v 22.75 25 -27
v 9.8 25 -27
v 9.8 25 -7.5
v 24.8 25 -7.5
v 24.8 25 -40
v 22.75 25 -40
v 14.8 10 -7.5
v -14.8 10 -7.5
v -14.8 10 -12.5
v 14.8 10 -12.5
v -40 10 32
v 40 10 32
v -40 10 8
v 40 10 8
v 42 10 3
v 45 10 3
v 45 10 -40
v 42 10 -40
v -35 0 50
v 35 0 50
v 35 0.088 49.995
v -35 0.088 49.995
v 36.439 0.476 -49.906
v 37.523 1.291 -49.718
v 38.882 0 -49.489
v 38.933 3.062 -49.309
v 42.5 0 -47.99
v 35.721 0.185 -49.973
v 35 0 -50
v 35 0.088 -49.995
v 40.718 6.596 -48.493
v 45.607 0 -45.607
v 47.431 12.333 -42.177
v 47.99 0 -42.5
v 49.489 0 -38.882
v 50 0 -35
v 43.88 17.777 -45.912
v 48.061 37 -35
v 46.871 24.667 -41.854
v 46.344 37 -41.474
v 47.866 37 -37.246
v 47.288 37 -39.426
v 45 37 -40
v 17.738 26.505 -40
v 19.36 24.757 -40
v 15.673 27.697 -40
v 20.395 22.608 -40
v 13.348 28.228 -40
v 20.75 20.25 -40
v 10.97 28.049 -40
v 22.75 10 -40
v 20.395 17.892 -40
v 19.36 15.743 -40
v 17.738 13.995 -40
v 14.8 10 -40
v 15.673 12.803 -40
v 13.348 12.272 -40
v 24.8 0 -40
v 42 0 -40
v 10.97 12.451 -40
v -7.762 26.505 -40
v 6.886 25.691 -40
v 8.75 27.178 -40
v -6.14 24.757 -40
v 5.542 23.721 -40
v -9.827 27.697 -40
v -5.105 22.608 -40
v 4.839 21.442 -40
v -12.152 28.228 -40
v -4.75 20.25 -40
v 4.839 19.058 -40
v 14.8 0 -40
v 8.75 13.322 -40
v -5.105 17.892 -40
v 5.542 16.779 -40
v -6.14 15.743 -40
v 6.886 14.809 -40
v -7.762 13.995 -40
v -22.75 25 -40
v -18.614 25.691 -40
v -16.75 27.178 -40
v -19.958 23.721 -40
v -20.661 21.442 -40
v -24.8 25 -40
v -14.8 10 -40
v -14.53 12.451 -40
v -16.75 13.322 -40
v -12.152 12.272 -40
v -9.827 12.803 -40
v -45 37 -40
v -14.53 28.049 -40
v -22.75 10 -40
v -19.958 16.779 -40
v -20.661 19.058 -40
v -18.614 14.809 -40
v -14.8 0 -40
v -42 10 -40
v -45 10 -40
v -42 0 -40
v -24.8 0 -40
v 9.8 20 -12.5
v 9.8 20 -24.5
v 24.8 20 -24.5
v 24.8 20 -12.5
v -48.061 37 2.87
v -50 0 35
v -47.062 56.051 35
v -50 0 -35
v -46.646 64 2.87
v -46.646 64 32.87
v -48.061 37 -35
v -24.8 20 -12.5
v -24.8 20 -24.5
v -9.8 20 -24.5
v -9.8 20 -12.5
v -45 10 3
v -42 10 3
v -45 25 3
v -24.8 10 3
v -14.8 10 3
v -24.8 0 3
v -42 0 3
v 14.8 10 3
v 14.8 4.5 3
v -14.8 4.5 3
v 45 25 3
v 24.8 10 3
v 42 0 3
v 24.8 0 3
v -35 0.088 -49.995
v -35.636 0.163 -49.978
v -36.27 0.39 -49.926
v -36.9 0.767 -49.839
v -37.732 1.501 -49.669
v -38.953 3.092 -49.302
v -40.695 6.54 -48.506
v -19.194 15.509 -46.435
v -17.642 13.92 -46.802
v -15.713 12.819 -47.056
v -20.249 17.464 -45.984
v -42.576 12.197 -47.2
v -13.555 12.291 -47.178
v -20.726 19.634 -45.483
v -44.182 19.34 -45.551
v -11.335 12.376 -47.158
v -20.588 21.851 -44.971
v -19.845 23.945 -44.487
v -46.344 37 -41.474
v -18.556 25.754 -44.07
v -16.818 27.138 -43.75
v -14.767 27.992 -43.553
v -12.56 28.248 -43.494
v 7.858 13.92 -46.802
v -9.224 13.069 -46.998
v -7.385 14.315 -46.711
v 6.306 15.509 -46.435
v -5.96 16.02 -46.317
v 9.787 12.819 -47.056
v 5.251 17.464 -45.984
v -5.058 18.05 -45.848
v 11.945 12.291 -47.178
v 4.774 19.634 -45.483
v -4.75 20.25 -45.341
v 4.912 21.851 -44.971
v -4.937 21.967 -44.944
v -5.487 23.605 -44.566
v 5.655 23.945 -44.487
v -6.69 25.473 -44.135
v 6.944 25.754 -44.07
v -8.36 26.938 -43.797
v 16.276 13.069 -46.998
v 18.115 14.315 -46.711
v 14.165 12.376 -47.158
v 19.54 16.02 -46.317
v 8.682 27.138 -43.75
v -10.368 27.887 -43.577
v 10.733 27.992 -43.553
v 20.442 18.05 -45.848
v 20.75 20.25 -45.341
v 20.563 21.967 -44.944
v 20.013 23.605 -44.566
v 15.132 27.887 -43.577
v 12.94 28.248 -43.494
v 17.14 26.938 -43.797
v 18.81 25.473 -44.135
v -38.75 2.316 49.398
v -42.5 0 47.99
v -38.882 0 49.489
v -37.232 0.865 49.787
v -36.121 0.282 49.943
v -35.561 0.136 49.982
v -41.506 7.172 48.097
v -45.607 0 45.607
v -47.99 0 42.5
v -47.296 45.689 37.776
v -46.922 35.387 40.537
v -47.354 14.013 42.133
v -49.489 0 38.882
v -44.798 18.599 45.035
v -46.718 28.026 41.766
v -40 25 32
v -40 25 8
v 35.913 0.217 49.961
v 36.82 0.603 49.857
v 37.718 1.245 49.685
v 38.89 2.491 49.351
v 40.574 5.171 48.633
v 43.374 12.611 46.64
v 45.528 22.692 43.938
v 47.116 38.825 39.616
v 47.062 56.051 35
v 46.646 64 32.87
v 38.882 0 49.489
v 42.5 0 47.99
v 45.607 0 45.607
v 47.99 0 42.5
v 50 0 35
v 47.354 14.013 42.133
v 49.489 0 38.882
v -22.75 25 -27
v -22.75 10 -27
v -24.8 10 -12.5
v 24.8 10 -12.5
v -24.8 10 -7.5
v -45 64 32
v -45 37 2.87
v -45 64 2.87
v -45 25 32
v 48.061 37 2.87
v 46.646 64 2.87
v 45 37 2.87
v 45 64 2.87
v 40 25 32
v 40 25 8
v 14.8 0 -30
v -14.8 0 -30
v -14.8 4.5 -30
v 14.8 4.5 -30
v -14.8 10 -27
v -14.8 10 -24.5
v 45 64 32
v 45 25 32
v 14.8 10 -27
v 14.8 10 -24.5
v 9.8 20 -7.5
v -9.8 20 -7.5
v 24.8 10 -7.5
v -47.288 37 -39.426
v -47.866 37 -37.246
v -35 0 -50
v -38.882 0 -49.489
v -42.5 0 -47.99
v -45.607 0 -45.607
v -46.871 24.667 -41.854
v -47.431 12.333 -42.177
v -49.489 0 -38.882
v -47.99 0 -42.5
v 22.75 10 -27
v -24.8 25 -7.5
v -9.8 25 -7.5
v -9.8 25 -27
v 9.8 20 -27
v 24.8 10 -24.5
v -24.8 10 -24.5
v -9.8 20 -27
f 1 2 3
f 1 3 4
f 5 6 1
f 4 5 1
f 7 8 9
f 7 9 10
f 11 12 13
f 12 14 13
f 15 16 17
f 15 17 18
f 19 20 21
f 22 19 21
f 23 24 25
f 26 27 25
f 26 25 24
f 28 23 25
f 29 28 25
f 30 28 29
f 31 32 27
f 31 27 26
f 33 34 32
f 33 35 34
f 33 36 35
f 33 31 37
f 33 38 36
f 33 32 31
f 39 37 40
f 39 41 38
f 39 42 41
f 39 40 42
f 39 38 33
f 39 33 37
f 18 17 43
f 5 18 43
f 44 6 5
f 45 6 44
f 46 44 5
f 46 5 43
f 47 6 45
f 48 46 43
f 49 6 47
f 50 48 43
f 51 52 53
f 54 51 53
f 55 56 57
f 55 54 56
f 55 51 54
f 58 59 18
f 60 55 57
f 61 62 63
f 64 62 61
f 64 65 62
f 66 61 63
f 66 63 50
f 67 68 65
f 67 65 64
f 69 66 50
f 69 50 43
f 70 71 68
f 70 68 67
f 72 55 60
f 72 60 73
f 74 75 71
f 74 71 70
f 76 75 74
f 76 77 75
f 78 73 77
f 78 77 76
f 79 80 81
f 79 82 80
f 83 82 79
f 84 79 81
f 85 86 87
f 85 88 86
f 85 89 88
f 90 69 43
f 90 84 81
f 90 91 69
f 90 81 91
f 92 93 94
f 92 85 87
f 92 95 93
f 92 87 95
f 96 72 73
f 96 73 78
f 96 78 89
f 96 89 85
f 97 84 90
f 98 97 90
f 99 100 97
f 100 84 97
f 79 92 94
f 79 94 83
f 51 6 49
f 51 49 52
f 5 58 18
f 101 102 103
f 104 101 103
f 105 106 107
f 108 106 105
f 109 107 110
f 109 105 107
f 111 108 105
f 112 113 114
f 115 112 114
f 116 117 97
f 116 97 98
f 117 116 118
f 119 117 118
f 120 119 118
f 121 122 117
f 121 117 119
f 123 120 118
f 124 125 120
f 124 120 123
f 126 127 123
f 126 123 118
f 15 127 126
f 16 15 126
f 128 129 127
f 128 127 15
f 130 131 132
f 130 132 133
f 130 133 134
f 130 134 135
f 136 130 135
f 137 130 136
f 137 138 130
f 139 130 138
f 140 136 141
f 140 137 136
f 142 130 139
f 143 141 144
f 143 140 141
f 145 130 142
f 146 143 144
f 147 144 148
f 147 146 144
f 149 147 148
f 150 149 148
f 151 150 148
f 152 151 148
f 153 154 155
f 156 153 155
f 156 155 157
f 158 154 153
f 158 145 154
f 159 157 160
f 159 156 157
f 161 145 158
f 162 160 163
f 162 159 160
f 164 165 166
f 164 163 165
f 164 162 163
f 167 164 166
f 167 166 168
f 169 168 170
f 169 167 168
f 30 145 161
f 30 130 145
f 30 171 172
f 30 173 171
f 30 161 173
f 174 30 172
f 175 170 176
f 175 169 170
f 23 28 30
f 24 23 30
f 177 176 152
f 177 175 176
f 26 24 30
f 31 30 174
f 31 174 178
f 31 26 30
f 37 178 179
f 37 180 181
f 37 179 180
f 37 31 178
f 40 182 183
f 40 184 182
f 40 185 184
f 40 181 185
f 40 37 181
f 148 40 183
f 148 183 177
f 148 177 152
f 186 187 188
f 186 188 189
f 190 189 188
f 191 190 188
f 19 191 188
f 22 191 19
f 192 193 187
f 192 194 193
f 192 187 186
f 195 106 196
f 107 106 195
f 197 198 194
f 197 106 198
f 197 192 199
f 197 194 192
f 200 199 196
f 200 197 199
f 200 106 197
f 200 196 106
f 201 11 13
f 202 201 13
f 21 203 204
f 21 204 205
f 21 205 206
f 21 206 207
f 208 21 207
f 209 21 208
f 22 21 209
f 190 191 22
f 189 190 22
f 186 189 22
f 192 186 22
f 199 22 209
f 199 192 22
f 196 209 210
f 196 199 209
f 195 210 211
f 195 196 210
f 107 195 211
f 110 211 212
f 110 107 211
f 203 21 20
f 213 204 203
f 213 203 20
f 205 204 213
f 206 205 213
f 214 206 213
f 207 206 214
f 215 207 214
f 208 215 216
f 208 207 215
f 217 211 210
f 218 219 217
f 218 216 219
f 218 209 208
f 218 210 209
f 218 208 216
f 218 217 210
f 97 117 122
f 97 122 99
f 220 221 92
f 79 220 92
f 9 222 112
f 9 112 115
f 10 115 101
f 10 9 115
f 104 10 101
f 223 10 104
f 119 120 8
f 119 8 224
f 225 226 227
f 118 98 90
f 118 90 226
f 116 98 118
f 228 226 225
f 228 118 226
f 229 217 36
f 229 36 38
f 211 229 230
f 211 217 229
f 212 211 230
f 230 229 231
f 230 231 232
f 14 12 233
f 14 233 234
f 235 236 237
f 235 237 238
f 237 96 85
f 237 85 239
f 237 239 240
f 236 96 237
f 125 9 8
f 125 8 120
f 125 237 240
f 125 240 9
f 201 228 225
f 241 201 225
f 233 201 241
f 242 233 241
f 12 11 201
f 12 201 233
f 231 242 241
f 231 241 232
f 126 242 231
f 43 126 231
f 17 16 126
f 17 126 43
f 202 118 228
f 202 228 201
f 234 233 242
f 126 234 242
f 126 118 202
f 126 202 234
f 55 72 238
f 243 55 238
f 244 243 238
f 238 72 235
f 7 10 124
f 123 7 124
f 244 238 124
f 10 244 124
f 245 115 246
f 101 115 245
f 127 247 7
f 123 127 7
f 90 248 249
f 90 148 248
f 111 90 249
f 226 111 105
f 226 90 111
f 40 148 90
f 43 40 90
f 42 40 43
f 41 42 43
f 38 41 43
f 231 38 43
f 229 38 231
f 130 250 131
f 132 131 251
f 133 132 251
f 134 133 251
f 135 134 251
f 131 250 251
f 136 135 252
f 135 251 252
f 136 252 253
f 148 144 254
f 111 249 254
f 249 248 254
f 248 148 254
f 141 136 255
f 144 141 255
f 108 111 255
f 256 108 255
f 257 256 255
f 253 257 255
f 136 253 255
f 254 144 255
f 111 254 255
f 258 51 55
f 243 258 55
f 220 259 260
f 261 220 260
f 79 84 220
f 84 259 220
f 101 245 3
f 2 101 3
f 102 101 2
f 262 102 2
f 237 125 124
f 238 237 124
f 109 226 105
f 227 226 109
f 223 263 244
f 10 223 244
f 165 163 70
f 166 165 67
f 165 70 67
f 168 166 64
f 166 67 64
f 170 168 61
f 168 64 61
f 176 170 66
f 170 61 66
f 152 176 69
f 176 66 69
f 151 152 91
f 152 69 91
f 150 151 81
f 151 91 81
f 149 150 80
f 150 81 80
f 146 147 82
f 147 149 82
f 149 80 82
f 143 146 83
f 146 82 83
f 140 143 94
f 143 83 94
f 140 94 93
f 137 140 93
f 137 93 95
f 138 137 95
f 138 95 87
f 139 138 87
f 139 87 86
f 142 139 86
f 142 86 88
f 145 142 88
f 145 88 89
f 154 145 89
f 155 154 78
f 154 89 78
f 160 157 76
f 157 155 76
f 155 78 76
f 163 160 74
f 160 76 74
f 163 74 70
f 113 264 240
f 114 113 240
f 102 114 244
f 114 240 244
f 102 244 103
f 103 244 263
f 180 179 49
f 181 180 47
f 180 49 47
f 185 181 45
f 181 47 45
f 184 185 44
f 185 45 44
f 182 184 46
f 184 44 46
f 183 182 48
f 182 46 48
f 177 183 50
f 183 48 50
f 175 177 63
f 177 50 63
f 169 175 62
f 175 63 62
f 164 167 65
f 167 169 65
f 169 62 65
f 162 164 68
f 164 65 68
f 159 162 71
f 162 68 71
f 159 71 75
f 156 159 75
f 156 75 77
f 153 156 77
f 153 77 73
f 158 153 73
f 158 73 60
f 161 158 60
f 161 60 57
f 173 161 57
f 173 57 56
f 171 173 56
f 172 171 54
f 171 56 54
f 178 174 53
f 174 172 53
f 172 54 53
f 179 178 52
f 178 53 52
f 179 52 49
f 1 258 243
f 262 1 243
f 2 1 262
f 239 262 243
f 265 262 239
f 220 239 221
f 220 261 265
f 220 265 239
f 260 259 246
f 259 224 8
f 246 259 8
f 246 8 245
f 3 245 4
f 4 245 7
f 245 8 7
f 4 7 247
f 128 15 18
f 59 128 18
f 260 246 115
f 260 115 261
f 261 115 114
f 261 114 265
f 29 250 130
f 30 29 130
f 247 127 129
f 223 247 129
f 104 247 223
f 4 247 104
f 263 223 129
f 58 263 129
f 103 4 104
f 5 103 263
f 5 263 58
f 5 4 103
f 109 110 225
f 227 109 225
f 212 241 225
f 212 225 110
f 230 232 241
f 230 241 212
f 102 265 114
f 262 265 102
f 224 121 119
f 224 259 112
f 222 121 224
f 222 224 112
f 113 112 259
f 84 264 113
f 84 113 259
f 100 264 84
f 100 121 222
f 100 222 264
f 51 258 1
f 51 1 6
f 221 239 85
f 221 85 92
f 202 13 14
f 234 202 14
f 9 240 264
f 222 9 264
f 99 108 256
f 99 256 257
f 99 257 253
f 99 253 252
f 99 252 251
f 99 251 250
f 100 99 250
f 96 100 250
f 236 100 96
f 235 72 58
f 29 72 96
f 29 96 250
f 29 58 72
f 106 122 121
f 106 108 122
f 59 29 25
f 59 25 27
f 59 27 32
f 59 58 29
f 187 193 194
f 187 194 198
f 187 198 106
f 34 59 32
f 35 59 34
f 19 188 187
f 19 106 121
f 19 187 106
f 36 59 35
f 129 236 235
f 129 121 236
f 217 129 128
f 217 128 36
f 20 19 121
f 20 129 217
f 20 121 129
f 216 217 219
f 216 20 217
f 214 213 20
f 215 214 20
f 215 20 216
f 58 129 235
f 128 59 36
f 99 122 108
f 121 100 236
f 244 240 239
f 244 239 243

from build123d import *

# Parameters (mm, degrees)
BOSS_EXTRUDE1_DEPTH     = 10
SKETCH2_W               = 17.2
SKETCH2_H               = 43
CUT_EXTRUDE1_DEPTH      = 72.414284285
SKETCH3_W               = 90
SKETCH3_H               = 34
SKETCH3_W_2             = 80
SKETCH3_H_2             = 24
BOSS_EXTRUDE3_DEPTH     = 15
SKETCH4_W               = 49.6
SKETCH4_H               = 5
BOSS_EXTRUDE4_DEPTH     = 10
SKETCH5_W               = 15
SKETCH5_H               = 22
BOSS_EXTRUDE5_DEPTH     = 5
SKETCH6_W               = 90
SKETCH6_H               = 77
BOSS_EXTRUDE6_DEPTH     = 15
BOSS_EXTRUDE8_DEPTH     = 39
CHAMFER1_SIZE           = 64
CHAMFER1_SIZE_2         = 3.354097874
CHAMFER2_SIZE           = 64
CHAMFER2_SIZE_2         = 11.405813635
CHAMFER3_SIZE           = 64
CHAMFER3_SIZE_2         = 13.775745352
CUT_EXTRUDE3_DEPTH      = 95.500525601
CUT_EXTRUDE3_DEPTH_BACK = 95.500525601
SKETCH10_W              = 50
SKETCH10_H              = 27
SKETCH15_R              = 8
CUT_EXTRUDE5_DEPTH      = 122.227059686
CUT_EXTRUDE6_DEPTH      = 2.5
SKETCH18_W              = 29.6
SKETCH18_H              = 43
CUT_EXTRUDE7_DEPTH      = 10
CUT_EXTRUDE8_DEPTH      = 15
SKETCH21_W              = 29.6
SKETCH21_H              = 33
BOSS_EXTRUDE10_DEPTH    = 4.5
SKETCH23_W              = 2.05
SKETCH23_H              = 13
BOSS_EXTRUDE11_DEPTH    = 15


with BuildPart() as part:
    # Sketch1 → Boss-Extrude1 (new body)
    with BuildSketch(Plane(origin=(0, 0, 0), x_dir=(1, 0, 0), z_dir=(0, 1, 0))):
        with BuildLine():
            Line((-35, 50), (35, 50))
            ThreePointArc((35, 50), (45.606601718, 45.606601718), (50, 35))
            Line((50, 35), (50, -35))
            ThreePointArc((50, -35), (45.606601718, -45.606601718), (35, -50))
            Line((35, -50), (-35, -50))
            ThreePointArc((-35, -50), (-45.606601718, -45.606601718), (-50, -35))
            Line((-50, -35), (-50, 35))
            ThreePointArc((-50, 35), (-45.606601718, 45.606601718), (-35, 50))
        make_face()
    extrude(amount=BOSS_EXTRUDE1_DEPTH)

    # Sketch2 → Cut-Extrude1 (cut, through all)
    with BuildSketch(Plane(origin=(0, 10, 0), x_dir=(1, 0, 0), z_dir=(0, 1, 0))):
        with Locations((-33.4, 18.5)):
            Rectangle(SKETCH2_W, SKETCH2_H)
        with Locations((33.4, 18.5)):
            Rectangle(SKETCH2_W, SKETCH2_H)
    extrude(amount=-CUT_EXTRUDE1_DEPTH, mode=Mode.SUBTRACT)

    # Sketch3 → Boss-Extrude3 (add)
    with BuildSketch(Plane(origin=(0, 10, 0), x_dir=(1, 0, 0), z_dir=(0, 1, 0))):
        with Locations((0, -20)):
            Rectangle(SKETCH3_W, SKETCH3_H)
        with Locations((0, -20)):
            Rectangle(SKETCH3_W_2, SKETCH3_H_2, mode=Mode.SUBTRACT)
    extrude(amount=BOSS_EXTRUDE3_DEPTH)

    # Sketch4 → Boss-Extrude4 (add)
    with BuildSketch(Plane(origin=(0, 10, 0), x_dir=(1, 0, 0), z_dir=(0, 1, 0))):
        with Locations((0, 10)):
            Rectangle(SKETCH4_W, SKETCH4_H)
        with Locations((0, 27)):
            Rectangle(SKETCH4_W, SKETCH4_H)
    extrude(amount=BOSS_EXTRUDE4_DEPTH)

    # Sketch5 → Boss-Extrude5 (add)
    with BuildSketch(Plane(origin=(0, 20, 0), x_dir=(1, 0, 0), z_dir=(0, 1, 0))):
        with Locations((-17.3, 18.5)):
            Rectangle(SKETCH5_W, SKETCH5_H)
        with Locations((17.3, 18.5)):
            Rectangle(SKETCH5_W, SKETCH5_H)
    extrude(amount=BOSS_EXTRUDE5_DEPTH)

    # Sketch6 → Boss-Extrude6 (add)
    with BuildSketch(Plane(origin=(0, 10, 0), x_dir=(1, 0, 0), z_dir=(0, 1, 0))):
        with BuildLine():
            Line((-50, 35), (-50, -35))
            ThreePointArc((-50, -35), (-45.606601718, -45.606601718), (-35, -50))
            Line((-35, -50), (35, -50))
            ThreePointArc((35, -50), (45.606601718, -45.606601718), (50, -35))
            Line((50, -35), (50, 35))
            ThreePointArc((50, 35), (45.606601718, 45.606601718), (35, 50))
            Line((35, 50), (-35, 50))
            ThreePointArc((-35, 50), (-45.606601718, 45.606601718), (-50, 35))
        make_face()
        with Locations((0, 1.5)):
            Rectangle(SKETCH6_W, SKETCH6_H, mode=Mode.SUBTRACT)
    extrude(amount=BOSS_EXTRUDE6_DEPTH)

    # Sketch9 → Boss-Extrude8 (add)
    with BuildSketch(Plane(origin=(0, 25, 0), x_dir=(1, 0, 0), z_dir=(0, 1, 0))):
        with BuildLine():
            Line((-50, 35), (-50, -35))
            ThreePointArc((-50, -35), (-45.606601718, -45.606601718), (-35, -50))
            Line((-35, -50), (35, -50))
            ThreePointArc((35, -50), (45.606601718, -45.606601718), (50, -35))
            Line((50, -35), (50, 35))
            ThreePointArc((50, 35), (45.606601718, 45.606601718), (35, 50))
            Line((35, 50), (-35, 50))
            ThreePointArc((-35, 50), (-45.606601718, 45.606601718), (-50, 35))
        make_face()
        with BuildLine():
            Line((-45, 35), (-45, -32))
            Line((-45, -32), (45, -32))
            Line((45, -32), (45, 35))
            ThreePointArc((45, 35), (44.659258263, 37.588190451), (43.660254038, 40))
            Line((43.660254038, 40), (-43.660254038, 40))
            ThreePointArc((-43.660254038, 40), (-44.659258263, 37.588190451), (-45, 35))
        make_face(mode=Mode.SUBTRACT)
    extrude(amount=BOSS_EXTRUDE8_DEPTH)

    # Chamfer1
    # the kernel refuses this chamfer: 64, 3.354097874 mm, written as the material it takes off along each edge
    with BuildSketch(Plane(origin=(-35, 64, 50), x_dir=(0, -0.9999979738662979, 0.002013023422382214), z_dir=(1, 0, 0)), Plane(origin=(50, 64, 35), x_dir=(0.002013023422382214, -0.9999979738662979, 0), z_dir=(0, 0, -1)), Plane(origin=(-50, 64, -35), x_dir=(-0.002013023422382214, -0.9999979738662979, 0), z_dir=(0, 0, 1)), Plane(origin=(35, 64, -50), x_dir=(0, -0.9999979738662979, -0.002013023422382214), z_dir=(-1, 0, 0))) as chamfer1_piece_1:
        Polygon((CHAMFER1_SIZE * 0.999997973866, CHAMFER1_SIZE * 0.00201302342238), (-CHAMFER1_SIZE_2 * 0.00201302342245, CHAMFER1_SIZE_2 * 0.9999979739), (0, 0), align=None)
    extrude(amount=70, mode=Mode.SUBTRACT)
    with BuildSketch(Plane(origin=(35, 64, 35), x_dir=(0, 0, 1), z_dir=(-1, 0, 0))) as chamfer1_piece_2:
        Polygon((15, -CHAMFER1_SIZE), (15 - CHAMFER1_SIZE_2, 0), (15, 0), align=None)
    revolve(axis=Axis((35, 64, 35), (0, 1, 0)), revolution_arc=90, mode=Mode.SUBTRACT)
    with BuildSketch(Plane(origin=(-35, 64, 35), x_dir=(-1, 0, 0), z_dir=(0, 0, -1))) as chamfer1_piece_3:
        Polygon((15, -CHAMFER1_SIZE), (15 - CHAMFER1_SIZE_2, 0), (15, 0), align=None)
    revolve(axis=Axis((-35, 64, 35), (0, 1, 0)), revolution_arc=90, mode=Mode.SUBTRACT)
    with BuildSketch(Plane(origin=(35, 64, -35), x_dir=(1, 0, 0), z_dir=(0, 0, 1))) as chamfer1_piece_4:
        Polygon((15, -CHAMFER1_SIZE), (15 - CHAMFER1_SIZE_2, 0), (15, 0), align=None)
    revolve(axis=Axis((35, 64, -35), (0, 1, 0)), revolution_arc=90, mode=Mode.SUBTRACT)
    with BuildSketch(Plane(origin=(-35, 64, -35), x_dir=(0, 0, -1), z_dir=(1, 0, 0))) as chamfer1_piece_5:
        Polygon((15 - CHAMFER1_SIZE_2, 0), (15, -CHAMFER1_SIZE), (15, 0), align=None)
    revolve(axis=Axis((-35, 64, -35), (0, 1, 0)), revolution_arc=90, mode=Mode.SUBTRACT)

    # Chamfer2
    # the kernel refuses this chamfer: 64, 11.405813635 mm, written as the material it takes off along each edge
    with BuildSketch(Plane(origin=(201.306482971, 64, -46.645902126), x_dir=(0, -0.9982575003065525, -0.05900816114499234), z_dir=(-1, 0, 0))) as chamfer2_piece_1:
        Polygon((CHAMFER2_SIZE * 0.999977671636, CHAMFER2_SIZE * 0.0066825316561), (-CHAMFER2_SIZE_2 * 0.0590081611462, CHAMFER2_SIZE_2 * 0.998257500326), (0, 0), align=None)
    extrude(amount=402.612965942, mode=Mode.SUBTRACT)

    # Chamfer3
    # the kernel refuses this chamfer: 64, 13.775745352 mm, written as the material it takes off along each edge
    with BuildSketch(Plane(origin=(-201.265469314, 64, 46.645902126), x_dir=(0, -0.9981787050157903, 0.06032638604292662), z_dir=(1, 0, 0))) as chamfer3_piece_1:
        Polygon((CHAMFER3_SIZE * 0.999967974892, CHAMFER3_SIZE * 0.00800307379952), (-CHAMFER3_SIZE_2 * 0.060326386045, CHAMFER3_SIZE_2 * 0.99817870505), (0, 0), align=None)
    extrude(amount=402.530938629, mode=Mode.SUBTRACT)

    # Sketch10 → Cut-Extrude3 (cut, two sides: drawn at the far end of the back side and taken through both)
    with BuildSketch(Plane(origin=(0, 1.307501734, 0), x_dir=(0, 0, 1), z_dir=(-1, 0, 0)).offset(-CUT_EXTRUDE3_DEPTH_BACK)):
        with Locations((-22.129843227, 49.192498266)):
            Rectangle(SKETCH10_W, SKETCH10_H)
    extrude(amount=CUT_EXTRUDE3_DEPTH + CUT_EXTRUDE3_DEPTH_BACK, mode=Mode.SUBTRACT)

    # Sketch15 → Cut-Extrude5 (cut, through all)
    with BuildSketch(Plane.XY.offset(-40)):
        with Locations((-12.75, 20.25)):
            Circle(SKETCH15_R)
        with Locations((12.75, 20.25)):
            Circle(SKETCH15_R)
    extrude(amount=-CUT_EXTRUDE5_DEPTH, mode=Mode.SUBTRACT)

    # Sketch17 → Cut-Extrude6 (cut)
    with BuildSketch(Plane(origin=(0, 0, -29.5), x_dir=(-1, 0, 0), z_dir=(0, 0, -1))):
        Polygon((-24.8, 10), (24.8, 10), (24.8, 25), (9.8, 25), (9.8, 20), (-9.8, 20), (-9.8, 25), (-24.8, 25), align=None)
    extrude(amount=-CUT_EXTRUDE6_DEPTH, mode=Mode.SUBTRACT)

    # Sketch18 → Cut-Extrude7 (cut)
    with BuildSketch(Plane.XZ):
        with Locations((0, -18.5)):
            Rectangle(SKETCH18_W, SKETCH18_H)
    extrude(amount=-CUT_EXTRUDE7_DEPTH, mode=Mode.SUBTRACT)

    # Sketch20 → Cut-Extrude8 (cut)
    with BuildSketch(Plane.XZ.offset(-25)):
        with BuildLine():
            Line((-45, -35), (-45, -40))
            Line((-45, -40), (-43.660254038, -40))
            ThreePointArc((-43.660254038, -40), (-44.659258263, -37.588190451), (-45, -35))
        make_face()
        with BuildLine():
            Line((45, -40), (45, -35))
            ThreePointArc((45, -35), (44.659258263, -37.588190451), (43.660254038, -40))
            Line((43.660254038, -40), (45, -40))
        make_face()
    extrude(amount=-CUT_EXTRUDE8_DEPTH, mode=Mode.SUBTRACT)

    # Sketch21 → Boss-Extrude10 (add)
    with BuildSketch(Plane.XZ):
        with Locations((0, -13.5)):
            Rectangle(SKETCH21_W, SKETCH21_H)
    extrude(amount=-BOSS_EXTRUDE10_DEPTH)

    # Sketch23 → Boss-Extrude11 (add)
    with BuildSketch(Plane(origin=(0, 10, 0), x_dir=(1, 0, 0), z_dir=(0, 1, 0))):
        with Locations((-23.775, 33.5)):
            Rectangle(SKETCH23_W, SKETCH23_H)
        with Locations((23.775, 33.5)):
            Rectangle(SKETCH23_W, SKETCH23_H)
    extrude(amount=BOSS_EXTRUDE11_DEPTH)


solid = part.part
